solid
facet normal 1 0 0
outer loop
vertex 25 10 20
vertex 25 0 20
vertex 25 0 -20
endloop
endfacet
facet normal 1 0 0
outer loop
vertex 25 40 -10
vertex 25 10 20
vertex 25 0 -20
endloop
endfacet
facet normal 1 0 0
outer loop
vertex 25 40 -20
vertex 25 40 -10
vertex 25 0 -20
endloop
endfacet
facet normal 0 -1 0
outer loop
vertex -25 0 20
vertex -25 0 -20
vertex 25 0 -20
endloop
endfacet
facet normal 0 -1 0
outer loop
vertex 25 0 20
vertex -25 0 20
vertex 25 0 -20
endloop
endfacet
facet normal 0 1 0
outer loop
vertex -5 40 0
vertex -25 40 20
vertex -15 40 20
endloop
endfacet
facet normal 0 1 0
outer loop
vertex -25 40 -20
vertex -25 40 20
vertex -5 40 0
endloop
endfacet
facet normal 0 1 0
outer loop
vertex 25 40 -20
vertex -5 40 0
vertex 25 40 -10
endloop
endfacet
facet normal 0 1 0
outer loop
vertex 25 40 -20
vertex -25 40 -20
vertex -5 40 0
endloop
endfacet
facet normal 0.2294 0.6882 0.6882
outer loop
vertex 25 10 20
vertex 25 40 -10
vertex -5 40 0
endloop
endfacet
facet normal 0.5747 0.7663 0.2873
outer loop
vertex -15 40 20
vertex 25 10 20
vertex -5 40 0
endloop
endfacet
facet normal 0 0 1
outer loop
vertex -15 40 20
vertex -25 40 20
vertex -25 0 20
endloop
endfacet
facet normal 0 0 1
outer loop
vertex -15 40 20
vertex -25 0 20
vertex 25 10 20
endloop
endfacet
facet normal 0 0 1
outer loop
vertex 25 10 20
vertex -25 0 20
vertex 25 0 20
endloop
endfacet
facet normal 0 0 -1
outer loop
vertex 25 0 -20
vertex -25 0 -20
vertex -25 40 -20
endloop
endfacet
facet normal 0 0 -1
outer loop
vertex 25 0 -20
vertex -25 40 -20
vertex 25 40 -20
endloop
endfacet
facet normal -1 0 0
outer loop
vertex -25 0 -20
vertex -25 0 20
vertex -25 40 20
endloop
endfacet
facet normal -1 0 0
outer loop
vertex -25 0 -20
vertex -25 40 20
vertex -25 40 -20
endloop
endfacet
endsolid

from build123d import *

# Parameters (mm, degrees)
SKETCH_18_W          = 50
SKETCH_18_H          = 40
EXTRUDE_2_DEPTH      = 40
CUT_EXTRUDE_9_DEPTH  = 40
CUT_EXTRUDE_10_DEPTH = 40


with BuildPart() as part:
    # 草圖18 → 填料-伸長2 (new body)
    with BuildSketch(Plane(origin=(0, 0, 0), x_dir=(1, 0, 0), z_dir=(0, 1, 0))):
        Rectangle(SKETCH_18_W, SKETCH_18_H)
    extrude(amount=EXTRUDE_2_DEPTH)

    # 草圖28 → 除料-伸長9 (cut)
    with BuildSketch(Plane(origin=(15.963302752, 21.28440367, 7.981651376), x_dir=(0.818367137, -0.538104419, -0.201789157), z_dir=(0.574695771, 0.766261028, 0.287347886))):
        Polygon((-37.835466942, -4.681645888), (-25.616012434, 14.044937664), (11.042351093, -15.215349135), align=None)
    extrude(amount=CUT_EXTRUDE_9_DEPTH, mode=Mode.SUBTRACT)

    # 草圖31 → 除料-伸長10 (cut)
    with BuildSketch(Plane(origin=(6.052631579, 18.157894737, 18.157894737), x_dir=(-0.973328527, 0.162221421, 0.162221421), z_dir=(-0.229415734, -0.688247202, -0.688247202))):
        Polygon((11.355499479, 28.284271247), (-19.466570536, 35.355339059), (-19.466570536, -7.071067812), align=None)
    extrude(amount=-CUT_EXTRUDE_10_DEPTH, mode=Mode.SUBTRACT)


solid = part.part
